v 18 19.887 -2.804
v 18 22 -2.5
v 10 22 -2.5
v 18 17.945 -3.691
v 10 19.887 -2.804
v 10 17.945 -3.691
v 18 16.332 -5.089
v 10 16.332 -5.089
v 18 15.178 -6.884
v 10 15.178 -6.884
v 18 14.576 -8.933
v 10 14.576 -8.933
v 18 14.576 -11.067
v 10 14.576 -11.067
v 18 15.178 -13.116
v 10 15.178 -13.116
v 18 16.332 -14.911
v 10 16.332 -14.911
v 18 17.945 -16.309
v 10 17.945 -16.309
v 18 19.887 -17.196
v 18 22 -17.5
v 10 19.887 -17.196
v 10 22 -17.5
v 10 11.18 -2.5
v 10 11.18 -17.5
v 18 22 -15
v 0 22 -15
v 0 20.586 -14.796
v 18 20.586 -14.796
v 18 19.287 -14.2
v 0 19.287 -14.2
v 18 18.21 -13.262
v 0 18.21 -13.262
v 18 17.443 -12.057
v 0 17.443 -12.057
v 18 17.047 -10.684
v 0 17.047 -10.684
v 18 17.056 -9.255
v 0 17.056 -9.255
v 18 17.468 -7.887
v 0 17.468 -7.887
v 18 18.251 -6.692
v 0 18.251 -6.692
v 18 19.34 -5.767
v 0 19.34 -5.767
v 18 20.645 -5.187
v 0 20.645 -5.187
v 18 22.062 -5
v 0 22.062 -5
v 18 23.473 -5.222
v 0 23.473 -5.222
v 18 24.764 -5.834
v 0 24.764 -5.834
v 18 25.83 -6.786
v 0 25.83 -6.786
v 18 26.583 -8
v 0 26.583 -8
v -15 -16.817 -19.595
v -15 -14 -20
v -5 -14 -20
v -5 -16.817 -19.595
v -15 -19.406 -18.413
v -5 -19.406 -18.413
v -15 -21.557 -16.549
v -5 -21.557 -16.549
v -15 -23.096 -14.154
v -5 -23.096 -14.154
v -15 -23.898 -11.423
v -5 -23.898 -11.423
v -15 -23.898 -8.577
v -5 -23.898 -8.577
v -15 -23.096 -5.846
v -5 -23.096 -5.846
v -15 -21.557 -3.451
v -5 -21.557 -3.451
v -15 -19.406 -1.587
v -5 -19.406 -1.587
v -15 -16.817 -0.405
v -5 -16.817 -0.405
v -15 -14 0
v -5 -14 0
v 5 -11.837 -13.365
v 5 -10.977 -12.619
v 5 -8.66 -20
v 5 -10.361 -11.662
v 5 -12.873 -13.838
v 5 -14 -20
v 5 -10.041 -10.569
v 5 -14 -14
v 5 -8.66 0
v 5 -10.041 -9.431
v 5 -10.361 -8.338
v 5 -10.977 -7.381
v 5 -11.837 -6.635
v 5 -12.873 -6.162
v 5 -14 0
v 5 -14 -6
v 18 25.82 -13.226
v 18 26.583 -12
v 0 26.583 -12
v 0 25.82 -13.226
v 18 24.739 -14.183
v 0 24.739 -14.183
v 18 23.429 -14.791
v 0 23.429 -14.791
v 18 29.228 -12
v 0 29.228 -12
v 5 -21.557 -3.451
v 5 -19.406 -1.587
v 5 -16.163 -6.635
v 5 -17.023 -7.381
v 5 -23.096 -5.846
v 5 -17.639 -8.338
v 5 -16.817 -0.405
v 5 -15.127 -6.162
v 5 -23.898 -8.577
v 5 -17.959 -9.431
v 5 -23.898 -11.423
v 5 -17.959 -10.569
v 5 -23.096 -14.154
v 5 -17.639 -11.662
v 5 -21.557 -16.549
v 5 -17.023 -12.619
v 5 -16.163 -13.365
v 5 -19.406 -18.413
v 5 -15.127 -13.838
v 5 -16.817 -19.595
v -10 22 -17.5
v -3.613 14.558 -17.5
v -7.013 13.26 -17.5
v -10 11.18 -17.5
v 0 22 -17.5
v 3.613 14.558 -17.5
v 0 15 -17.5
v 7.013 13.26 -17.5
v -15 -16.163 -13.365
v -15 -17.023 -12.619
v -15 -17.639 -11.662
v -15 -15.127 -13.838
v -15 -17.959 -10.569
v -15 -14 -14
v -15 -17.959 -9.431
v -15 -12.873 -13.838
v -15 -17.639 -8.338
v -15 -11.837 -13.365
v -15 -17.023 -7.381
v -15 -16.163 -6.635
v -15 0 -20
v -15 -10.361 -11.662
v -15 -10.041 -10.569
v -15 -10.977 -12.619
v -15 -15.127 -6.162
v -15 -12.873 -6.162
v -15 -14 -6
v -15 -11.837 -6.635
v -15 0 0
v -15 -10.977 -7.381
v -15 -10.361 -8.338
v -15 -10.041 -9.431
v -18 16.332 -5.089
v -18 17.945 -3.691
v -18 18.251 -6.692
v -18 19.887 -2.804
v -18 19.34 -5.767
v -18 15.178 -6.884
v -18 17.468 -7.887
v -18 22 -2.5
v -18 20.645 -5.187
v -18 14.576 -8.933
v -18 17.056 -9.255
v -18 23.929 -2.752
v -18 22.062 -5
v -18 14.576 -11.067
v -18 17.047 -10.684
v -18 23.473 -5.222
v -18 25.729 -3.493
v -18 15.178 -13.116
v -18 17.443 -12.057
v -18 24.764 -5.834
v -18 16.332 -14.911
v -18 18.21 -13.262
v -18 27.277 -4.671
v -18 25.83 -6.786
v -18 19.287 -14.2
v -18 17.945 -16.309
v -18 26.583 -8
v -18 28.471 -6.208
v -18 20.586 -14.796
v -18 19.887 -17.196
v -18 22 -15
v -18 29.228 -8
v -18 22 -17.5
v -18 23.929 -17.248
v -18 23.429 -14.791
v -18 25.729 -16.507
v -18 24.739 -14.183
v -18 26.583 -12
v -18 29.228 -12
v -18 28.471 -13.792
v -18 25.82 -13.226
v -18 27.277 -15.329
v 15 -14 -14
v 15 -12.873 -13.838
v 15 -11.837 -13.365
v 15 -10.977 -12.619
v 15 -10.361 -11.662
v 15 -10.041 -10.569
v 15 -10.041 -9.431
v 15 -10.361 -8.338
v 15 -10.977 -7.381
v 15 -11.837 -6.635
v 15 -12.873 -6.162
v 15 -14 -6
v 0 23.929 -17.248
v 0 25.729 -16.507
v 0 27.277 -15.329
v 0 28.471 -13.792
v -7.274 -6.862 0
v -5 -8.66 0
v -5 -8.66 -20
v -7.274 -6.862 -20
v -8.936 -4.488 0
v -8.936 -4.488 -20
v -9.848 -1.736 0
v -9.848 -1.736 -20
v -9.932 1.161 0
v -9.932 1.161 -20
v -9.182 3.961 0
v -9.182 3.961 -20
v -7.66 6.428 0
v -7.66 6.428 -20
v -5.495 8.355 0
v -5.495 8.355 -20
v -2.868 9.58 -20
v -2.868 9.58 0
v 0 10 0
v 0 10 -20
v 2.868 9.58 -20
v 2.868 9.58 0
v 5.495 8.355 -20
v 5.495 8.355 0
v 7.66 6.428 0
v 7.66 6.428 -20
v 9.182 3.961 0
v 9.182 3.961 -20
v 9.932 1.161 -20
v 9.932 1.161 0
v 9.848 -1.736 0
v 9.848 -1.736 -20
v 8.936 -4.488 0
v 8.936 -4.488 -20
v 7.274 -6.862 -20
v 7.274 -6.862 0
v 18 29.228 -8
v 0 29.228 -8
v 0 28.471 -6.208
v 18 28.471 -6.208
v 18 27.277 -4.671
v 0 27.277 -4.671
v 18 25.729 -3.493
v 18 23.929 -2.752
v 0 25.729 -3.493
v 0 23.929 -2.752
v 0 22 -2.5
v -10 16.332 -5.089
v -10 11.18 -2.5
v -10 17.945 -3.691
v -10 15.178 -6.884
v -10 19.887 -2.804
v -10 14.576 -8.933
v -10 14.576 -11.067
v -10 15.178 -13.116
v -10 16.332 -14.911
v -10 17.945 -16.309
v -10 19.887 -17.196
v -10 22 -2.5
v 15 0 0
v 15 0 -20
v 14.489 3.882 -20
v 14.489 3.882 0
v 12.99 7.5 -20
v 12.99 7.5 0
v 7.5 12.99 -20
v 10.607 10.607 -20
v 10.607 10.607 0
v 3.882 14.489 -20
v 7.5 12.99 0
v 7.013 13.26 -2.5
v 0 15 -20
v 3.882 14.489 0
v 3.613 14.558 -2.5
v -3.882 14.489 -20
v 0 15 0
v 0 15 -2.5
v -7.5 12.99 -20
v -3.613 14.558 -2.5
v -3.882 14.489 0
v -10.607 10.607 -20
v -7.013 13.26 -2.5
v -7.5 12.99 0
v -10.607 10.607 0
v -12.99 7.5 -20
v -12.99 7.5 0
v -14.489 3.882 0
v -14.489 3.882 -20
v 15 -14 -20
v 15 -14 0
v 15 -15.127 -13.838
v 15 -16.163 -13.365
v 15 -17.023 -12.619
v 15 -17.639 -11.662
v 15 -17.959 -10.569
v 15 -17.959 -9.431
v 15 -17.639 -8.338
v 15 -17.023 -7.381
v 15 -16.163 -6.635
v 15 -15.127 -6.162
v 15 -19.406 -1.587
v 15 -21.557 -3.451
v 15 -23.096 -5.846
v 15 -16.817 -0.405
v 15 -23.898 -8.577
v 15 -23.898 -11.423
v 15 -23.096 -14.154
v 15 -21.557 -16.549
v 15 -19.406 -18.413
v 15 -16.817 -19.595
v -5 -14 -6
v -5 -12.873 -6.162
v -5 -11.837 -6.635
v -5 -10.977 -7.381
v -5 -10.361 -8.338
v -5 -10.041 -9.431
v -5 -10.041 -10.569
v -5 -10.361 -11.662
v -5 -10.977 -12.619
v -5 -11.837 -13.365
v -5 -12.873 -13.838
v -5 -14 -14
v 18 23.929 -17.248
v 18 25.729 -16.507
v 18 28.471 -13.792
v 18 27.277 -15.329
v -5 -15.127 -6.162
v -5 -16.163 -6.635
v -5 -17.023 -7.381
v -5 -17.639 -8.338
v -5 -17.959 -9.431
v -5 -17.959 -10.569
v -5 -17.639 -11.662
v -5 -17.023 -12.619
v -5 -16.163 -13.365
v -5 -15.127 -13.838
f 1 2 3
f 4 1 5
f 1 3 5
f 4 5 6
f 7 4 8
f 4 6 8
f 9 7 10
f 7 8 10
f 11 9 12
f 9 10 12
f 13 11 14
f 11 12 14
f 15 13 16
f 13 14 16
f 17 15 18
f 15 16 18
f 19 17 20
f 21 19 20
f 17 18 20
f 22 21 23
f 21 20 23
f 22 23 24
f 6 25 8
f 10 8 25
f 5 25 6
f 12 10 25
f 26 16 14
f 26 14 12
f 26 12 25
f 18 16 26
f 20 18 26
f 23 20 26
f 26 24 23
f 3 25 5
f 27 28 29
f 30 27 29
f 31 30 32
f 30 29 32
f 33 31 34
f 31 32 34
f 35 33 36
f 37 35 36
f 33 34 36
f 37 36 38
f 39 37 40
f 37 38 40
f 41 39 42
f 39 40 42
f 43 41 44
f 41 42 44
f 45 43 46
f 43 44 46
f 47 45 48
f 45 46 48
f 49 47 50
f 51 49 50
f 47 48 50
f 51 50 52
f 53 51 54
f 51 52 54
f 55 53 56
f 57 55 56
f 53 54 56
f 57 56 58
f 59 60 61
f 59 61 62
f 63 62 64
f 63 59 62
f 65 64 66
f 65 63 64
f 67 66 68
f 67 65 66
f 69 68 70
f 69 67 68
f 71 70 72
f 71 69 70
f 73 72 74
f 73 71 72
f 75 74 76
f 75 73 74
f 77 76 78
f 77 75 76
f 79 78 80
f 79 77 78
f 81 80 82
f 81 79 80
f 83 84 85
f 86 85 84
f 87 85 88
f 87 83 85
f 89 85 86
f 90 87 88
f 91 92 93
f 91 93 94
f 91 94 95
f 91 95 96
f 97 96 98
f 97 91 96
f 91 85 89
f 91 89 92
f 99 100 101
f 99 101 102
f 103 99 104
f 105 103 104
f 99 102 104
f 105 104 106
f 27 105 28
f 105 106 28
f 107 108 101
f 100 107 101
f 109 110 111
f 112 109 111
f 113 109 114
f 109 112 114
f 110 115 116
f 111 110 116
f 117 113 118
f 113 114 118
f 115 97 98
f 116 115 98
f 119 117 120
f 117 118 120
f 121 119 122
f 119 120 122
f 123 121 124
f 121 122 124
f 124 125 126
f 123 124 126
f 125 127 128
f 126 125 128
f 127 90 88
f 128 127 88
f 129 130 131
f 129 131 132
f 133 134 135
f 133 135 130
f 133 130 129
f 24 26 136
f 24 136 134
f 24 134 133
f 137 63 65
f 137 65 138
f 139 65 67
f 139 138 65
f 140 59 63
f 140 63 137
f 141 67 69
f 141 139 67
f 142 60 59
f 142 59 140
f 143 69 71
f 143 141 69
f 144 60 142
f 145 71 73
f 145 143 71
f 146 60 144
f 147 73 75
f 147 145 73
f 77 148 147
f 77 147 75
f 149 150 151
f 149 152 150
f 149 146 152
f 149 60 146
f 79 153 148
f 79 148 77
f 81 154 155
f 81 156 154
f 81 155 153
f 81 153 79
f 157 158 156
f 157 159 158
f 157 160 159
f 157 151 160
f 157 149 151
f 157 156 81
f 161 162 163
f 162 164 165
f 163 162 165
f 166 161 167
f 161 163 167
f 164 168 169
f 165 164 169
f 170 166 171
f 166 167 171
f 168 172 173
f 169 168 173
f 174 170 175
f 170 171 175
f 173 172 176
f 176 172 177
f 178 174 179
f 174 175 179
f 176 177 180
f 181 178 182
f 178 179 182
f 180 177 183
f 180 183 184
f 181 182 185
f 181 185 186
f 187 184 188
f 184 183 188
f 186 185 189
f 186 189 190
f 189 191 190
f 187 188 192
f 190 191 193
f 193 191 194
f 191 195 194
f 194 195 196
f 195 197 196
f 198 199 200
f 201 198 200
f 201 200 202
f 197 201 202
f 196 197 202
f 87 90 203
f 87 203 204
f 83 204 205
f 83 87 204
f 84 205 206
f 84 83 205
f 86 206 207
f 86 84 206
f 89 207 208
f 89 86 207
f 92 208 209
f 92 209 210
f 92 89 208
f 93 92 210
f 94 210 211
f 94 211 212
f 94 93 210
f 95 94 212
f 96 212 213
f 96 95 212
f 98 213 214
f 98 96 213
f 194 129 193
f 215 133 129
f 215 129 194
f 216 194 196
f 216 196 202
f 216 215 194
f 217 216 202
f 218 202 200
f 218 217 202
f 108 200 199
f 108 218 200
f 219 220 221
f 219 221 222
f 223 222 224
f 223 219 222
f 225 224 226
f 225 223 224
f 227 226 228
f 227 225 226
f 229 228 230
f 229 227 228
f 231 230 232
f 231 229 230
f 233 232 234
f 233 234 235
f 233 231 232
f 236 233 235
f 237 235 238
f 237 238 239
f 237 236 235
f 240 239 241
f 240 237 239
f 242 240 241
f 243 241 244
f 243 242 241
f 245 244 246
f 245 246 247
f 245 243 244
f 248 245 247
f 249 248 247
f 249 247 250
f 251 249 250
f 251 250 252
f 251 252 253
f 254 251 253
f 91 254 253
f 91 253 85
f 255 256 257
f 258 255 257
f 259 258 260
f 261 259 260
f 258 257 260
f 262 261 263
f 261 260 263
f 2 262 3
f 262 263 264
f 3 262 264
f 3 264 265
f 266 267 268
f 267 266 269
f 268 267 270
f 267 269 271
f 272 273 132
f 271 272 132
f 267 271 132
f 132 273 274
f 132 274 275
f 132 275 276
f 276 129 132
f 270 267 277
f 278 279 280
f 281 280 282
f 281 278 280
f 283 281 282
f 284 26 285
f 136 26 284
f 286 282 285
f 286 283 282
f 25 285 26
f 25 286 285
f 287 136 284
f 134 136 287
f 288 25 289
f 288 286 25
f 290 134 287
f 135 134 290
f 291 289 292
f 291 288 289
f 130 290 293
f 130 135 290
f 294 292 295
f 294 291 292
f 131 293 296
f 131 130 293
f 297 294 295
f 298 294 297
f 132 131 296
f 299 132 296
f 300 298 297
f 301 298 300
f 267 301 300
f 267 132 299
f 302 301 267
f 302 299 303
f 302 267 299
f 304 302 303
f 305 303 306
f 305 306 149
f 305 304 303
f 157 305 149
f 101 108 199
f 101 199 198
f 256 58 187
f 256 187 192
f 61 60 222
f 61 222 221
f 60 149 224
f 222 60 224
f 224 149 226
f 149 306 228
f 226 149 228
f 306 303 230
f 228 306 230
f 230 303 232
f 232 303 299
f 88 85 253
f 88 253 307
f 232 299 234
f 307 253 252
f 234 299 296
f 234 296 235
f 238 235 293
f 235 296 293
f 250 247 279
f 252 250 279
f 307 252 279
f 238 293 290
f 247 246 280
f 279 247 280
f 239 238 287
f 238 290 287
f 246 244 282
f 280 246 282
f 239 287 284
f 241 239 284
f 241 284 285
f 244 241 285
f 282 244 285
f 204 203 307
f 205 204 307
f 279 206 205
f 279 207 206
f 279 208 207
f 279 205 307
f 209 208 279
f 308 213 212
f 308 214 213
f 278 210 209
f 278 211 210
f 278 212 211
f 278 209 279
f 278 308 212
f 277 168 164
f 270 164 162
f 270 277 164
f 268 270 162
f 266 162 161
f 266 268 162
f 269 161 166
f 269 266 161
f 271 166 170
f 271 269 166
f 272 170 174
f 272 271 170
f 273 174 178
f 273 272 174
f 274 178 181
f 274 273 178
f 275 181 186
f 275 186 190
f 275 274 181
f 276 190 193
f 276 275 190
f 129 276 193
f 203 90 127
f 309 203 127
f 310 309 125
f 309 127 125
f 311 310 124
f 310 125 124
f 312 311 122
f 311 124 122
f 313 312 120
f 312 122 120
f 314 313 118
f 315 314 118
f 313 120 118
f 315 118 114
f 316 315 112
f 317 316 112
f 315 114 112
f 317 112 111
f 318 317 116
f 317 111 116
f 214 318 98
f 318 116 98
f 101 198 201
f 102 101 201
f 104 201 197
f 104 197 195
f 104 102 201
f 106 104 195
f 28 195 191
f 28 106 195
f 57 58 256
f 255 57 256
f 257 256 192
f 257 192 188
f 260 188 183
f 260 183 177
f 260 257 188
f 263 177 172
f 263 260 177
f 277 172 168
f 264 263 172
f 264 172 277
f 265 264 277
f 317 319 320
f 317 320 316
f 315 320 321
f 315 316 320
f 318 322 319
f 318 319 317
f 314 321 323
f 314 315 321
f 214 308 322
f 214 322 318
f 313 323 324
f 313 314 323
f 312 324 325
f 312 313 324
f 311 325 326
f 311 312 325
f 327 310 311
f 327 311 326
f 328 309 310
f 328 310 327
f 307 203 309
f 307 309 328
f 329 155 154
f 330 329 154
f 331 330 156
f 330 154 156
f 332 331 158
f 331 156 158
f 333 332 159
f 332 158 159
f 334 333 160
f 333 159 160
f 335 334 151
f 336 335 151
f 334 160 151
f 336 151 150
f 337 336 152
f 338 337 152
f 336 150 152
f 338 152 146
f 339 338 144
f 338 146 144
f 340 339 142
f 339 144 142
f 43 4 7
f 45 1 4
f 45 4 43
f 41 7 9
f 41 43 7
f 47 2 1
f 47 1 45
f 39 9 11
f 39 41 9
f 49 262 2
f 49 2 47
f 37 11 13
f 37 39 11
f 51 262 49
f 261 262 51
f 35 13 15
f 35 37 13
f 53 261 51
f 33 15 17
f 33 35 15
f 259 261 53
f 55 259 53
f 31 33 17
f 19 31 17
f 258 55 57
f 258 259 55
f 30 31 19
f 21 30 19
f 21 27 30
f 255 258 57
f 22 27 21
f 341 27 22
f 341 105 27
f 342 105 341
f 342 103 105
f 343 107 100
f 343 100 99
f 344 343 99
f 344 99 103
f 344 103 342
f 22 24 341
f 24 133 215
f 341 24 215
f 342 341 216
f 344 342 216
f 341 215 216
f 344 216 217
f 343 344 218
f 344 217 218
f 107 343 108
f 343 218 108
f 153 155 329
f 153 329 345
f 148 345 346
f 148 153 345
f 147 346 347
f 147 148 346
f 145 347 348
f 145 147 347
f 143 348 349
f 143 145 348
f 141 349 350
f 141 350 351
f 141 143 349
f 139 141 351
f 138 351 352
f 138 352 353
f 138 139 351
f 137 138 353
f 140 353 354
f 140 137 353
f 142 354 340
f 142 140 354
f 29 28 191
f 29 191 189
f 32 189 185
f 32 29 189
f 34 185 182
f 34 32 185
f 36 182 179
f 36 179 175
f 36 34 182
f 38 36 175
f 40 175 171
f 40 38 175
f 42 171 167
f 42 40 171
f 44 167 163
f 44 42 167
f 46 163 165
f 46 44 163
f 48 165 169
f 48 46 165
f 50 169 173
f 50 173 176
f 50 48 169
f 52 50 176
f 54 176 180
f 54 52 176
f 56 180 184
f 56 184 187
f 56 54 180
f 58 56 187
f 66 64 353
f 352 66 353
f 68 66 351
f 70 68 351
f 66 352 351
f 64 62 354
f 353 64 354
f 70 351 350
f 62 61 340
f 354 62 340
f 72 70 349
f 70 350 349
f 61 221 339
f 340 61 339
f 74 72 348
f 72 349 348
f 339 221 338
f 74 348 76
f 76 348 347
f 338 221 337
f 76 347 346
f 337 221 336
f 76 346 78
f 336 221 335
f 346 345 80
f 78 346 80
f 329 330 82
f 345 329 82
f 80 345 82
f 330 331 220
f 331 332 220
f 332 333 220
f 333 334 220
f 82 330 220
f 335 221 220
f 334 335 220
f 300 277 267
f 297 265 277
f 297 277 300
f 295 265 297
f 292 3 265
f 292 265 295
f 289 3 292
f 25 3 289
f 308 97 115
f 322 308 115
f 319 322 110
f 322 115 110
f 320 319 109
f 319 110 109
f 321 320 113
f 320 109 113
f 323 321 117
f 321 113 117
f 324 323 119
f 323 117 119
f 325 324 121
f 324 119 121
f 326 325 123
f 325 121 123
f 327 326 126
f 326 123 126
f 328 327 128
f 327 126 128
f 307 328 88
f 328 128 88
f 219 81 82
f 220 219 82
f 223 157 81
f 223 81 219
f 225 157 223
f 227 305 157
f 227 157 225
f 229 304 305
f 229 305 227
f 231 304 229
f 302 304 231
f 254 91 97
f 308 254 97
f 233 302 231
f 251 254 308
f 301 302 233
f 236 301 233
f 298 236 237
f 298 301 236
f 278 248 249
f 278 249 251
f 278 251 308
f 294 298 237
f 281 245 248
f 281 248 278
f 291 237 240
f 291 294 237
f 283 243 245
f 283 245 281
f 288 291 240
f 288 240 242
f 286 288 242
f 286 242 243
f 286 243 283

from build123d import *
from build123d.topology import SkipClean

# Parameters (mm, degrees)
BIG_CYL_DEPTH       = 20
HALF_CIRCLE_DEPTH   = 10
SMALL_CYL_DEPTH     = 10
HALF_START          = -10
HALF_CIRCLE_2_DEPTH = 10
SMAL_START          = -10
SMAL_CYL_2_DEPTH    = 10
LONG_CYL_DEPTH      = 18
BASE_DEPTH          = 10


with BuildPart() as part:
    # Sketch1 → big cyl (new body)
    with BuildSketch(Plane.XY):
        with BuildLine():
            Line((-15, 0), (-15, -14))
            Line((-15, -14), (-5, -14))
            Line((-5, -14), (-5, -8.660254038))
            ThreePointArc((-5, -8.660254038), (0, 10), (5, -8.660254038))
            Line((5, -8.660254038), (5, -14))
            Line((5, -14), (15, -14))
            Line((15, -14), (15, 0))
            ThreePointArc((15, 0), (0, 15), (-15, 0))
        make_face()
    extrude(amount=-BIG_CYL_DEPTH)

    # Sketch2 → half circle (add)
    with BuildSketch(Plane.ZY.offset(15)):
        with BuildLine():
            Line((-14, -14), (-20, -14))
            ThreePointArc((-20, -14), (-10, -24), (0, -14))
            Line((0, -14), (-6, -14))
            ThreePointArc((-6, -14), (-10, -18), (-14, -14))
        make_face()
    extrude(amount=-HALF_CIRCLE_DEPTH)

    # Sketch2_5 → small cyl (cut)
    with SkipClean():  # the faces are left unmerged after this step: merging them gives an invalid solid
        with BuildSketch(Plane.ZY.offset(15)):
            with BuildLine():
                Line((-14, -14), (-6, -14))
                ThreePointArc((-6, -14), (-10, -10), (-14, -14))
            make_face()
        extrude(amount=-SMALL_CYL_DEPTH, mode=Mode.SUBTRACT)

    # Sketch4 → half circle 2 (add)
    with SkipClean():  # the faces are left unmerged after this step: merging them gives an invalid solid
        with BuildSketch(Plane(origin=(15, 0, 0), x_dir=(0, 0, -1), z_dir=(1, 0, 0)).offset(HALF_START)):
            with BuildLine():
                Line((6, -14), (0, -14))
                ThreePointArc((0, -14), (10, -24), (20, -14))
                Line((20, -14), (14, -14))
                ThreePointArc((14, -14), (10, -18), (6, -14))
            make_face()
        extrude(amount=HALF_CIRCLE_2_DEPTH)

    # Sketch4_4 → smal cyl 2 (cut)
    with SkipClean():  # the faces are left unmerged after this step: merging them gives an invalid solid
        with BuildSketch(Plane(origin=(15, 0, 0), x_dir=(0, 0, -1), z_dir=(1, 0, 0)).offset(SMAL_START)):
            with BuildLine():
                ThreePointArc((14, -14), (10, -10), (6, -14))
                Line((6, -14), (14, -14))
            make_face()
            with BuildLine():
                Line((14, -14), (6, -14))
                ThreePointArc((6, -14), (10, -18), (14, -14))
            make_face()
        extrude(amount=SMAL_CYL_2_DEPTH, mode=Mode.SUBTRACT)

    # Sketch5 → long cyl (add, symmetric)
    with SkipClean():  # the faces are left unmerged after this step: merging them gives an invalid solid
        with BuildSketch(Plane(origin=(0, 0, 0), x_dir=(0, 0, -1), z_dir=(1, 0, 0))):
            with BuildLine():
                ThreePointArc((8, 29.228416147), (4.031331807, 26.541475531), (2.5, 22))
                ThreePointArc((2.5, 22), (10, 14.5), (17.5, 22))
                ThreePointArc((17.5, 22), (15.968668193, 26.541475531), (12, 29.228416147))
                Line((12, 29.228416147), (12, 26.582575695))
                ThreePointArc((12, 26.582575695), (14.183300133, 24.738612788), (15, 22))
                ThreePointArc((15, 22), (7.261387212, 17.816699867), (8, 26.582575695))
                Line((8, 26.582575695), (8, 29.228416147))
            make_face()
        extrude(amount=LONG_CYL_DEPTH, both=True)

    # Sketch5_3 → base (add, symmetric)
    with SkipClean():  # the faces are left unmerged after this step: merging them gives an invalid solid
        with BuildSketch(Plane(origin=(0, 0, 0), x_dir=(0, 0, -1), z_dir=(1, 0, 0))):
            with BuildLine():
                ThreePointArc((17.5, 22), (10, 14.5), (2.5, 22))
                Line((2.5, 22), (2.5, 10.5))
                Line((2.5, 10.5), (17.5, 10.5))
                Line((17.5, 10.5), (17.5, 22))
            make_face()
        extrude(amount=BASE_DEPTH, both=True)


solid = part.part
